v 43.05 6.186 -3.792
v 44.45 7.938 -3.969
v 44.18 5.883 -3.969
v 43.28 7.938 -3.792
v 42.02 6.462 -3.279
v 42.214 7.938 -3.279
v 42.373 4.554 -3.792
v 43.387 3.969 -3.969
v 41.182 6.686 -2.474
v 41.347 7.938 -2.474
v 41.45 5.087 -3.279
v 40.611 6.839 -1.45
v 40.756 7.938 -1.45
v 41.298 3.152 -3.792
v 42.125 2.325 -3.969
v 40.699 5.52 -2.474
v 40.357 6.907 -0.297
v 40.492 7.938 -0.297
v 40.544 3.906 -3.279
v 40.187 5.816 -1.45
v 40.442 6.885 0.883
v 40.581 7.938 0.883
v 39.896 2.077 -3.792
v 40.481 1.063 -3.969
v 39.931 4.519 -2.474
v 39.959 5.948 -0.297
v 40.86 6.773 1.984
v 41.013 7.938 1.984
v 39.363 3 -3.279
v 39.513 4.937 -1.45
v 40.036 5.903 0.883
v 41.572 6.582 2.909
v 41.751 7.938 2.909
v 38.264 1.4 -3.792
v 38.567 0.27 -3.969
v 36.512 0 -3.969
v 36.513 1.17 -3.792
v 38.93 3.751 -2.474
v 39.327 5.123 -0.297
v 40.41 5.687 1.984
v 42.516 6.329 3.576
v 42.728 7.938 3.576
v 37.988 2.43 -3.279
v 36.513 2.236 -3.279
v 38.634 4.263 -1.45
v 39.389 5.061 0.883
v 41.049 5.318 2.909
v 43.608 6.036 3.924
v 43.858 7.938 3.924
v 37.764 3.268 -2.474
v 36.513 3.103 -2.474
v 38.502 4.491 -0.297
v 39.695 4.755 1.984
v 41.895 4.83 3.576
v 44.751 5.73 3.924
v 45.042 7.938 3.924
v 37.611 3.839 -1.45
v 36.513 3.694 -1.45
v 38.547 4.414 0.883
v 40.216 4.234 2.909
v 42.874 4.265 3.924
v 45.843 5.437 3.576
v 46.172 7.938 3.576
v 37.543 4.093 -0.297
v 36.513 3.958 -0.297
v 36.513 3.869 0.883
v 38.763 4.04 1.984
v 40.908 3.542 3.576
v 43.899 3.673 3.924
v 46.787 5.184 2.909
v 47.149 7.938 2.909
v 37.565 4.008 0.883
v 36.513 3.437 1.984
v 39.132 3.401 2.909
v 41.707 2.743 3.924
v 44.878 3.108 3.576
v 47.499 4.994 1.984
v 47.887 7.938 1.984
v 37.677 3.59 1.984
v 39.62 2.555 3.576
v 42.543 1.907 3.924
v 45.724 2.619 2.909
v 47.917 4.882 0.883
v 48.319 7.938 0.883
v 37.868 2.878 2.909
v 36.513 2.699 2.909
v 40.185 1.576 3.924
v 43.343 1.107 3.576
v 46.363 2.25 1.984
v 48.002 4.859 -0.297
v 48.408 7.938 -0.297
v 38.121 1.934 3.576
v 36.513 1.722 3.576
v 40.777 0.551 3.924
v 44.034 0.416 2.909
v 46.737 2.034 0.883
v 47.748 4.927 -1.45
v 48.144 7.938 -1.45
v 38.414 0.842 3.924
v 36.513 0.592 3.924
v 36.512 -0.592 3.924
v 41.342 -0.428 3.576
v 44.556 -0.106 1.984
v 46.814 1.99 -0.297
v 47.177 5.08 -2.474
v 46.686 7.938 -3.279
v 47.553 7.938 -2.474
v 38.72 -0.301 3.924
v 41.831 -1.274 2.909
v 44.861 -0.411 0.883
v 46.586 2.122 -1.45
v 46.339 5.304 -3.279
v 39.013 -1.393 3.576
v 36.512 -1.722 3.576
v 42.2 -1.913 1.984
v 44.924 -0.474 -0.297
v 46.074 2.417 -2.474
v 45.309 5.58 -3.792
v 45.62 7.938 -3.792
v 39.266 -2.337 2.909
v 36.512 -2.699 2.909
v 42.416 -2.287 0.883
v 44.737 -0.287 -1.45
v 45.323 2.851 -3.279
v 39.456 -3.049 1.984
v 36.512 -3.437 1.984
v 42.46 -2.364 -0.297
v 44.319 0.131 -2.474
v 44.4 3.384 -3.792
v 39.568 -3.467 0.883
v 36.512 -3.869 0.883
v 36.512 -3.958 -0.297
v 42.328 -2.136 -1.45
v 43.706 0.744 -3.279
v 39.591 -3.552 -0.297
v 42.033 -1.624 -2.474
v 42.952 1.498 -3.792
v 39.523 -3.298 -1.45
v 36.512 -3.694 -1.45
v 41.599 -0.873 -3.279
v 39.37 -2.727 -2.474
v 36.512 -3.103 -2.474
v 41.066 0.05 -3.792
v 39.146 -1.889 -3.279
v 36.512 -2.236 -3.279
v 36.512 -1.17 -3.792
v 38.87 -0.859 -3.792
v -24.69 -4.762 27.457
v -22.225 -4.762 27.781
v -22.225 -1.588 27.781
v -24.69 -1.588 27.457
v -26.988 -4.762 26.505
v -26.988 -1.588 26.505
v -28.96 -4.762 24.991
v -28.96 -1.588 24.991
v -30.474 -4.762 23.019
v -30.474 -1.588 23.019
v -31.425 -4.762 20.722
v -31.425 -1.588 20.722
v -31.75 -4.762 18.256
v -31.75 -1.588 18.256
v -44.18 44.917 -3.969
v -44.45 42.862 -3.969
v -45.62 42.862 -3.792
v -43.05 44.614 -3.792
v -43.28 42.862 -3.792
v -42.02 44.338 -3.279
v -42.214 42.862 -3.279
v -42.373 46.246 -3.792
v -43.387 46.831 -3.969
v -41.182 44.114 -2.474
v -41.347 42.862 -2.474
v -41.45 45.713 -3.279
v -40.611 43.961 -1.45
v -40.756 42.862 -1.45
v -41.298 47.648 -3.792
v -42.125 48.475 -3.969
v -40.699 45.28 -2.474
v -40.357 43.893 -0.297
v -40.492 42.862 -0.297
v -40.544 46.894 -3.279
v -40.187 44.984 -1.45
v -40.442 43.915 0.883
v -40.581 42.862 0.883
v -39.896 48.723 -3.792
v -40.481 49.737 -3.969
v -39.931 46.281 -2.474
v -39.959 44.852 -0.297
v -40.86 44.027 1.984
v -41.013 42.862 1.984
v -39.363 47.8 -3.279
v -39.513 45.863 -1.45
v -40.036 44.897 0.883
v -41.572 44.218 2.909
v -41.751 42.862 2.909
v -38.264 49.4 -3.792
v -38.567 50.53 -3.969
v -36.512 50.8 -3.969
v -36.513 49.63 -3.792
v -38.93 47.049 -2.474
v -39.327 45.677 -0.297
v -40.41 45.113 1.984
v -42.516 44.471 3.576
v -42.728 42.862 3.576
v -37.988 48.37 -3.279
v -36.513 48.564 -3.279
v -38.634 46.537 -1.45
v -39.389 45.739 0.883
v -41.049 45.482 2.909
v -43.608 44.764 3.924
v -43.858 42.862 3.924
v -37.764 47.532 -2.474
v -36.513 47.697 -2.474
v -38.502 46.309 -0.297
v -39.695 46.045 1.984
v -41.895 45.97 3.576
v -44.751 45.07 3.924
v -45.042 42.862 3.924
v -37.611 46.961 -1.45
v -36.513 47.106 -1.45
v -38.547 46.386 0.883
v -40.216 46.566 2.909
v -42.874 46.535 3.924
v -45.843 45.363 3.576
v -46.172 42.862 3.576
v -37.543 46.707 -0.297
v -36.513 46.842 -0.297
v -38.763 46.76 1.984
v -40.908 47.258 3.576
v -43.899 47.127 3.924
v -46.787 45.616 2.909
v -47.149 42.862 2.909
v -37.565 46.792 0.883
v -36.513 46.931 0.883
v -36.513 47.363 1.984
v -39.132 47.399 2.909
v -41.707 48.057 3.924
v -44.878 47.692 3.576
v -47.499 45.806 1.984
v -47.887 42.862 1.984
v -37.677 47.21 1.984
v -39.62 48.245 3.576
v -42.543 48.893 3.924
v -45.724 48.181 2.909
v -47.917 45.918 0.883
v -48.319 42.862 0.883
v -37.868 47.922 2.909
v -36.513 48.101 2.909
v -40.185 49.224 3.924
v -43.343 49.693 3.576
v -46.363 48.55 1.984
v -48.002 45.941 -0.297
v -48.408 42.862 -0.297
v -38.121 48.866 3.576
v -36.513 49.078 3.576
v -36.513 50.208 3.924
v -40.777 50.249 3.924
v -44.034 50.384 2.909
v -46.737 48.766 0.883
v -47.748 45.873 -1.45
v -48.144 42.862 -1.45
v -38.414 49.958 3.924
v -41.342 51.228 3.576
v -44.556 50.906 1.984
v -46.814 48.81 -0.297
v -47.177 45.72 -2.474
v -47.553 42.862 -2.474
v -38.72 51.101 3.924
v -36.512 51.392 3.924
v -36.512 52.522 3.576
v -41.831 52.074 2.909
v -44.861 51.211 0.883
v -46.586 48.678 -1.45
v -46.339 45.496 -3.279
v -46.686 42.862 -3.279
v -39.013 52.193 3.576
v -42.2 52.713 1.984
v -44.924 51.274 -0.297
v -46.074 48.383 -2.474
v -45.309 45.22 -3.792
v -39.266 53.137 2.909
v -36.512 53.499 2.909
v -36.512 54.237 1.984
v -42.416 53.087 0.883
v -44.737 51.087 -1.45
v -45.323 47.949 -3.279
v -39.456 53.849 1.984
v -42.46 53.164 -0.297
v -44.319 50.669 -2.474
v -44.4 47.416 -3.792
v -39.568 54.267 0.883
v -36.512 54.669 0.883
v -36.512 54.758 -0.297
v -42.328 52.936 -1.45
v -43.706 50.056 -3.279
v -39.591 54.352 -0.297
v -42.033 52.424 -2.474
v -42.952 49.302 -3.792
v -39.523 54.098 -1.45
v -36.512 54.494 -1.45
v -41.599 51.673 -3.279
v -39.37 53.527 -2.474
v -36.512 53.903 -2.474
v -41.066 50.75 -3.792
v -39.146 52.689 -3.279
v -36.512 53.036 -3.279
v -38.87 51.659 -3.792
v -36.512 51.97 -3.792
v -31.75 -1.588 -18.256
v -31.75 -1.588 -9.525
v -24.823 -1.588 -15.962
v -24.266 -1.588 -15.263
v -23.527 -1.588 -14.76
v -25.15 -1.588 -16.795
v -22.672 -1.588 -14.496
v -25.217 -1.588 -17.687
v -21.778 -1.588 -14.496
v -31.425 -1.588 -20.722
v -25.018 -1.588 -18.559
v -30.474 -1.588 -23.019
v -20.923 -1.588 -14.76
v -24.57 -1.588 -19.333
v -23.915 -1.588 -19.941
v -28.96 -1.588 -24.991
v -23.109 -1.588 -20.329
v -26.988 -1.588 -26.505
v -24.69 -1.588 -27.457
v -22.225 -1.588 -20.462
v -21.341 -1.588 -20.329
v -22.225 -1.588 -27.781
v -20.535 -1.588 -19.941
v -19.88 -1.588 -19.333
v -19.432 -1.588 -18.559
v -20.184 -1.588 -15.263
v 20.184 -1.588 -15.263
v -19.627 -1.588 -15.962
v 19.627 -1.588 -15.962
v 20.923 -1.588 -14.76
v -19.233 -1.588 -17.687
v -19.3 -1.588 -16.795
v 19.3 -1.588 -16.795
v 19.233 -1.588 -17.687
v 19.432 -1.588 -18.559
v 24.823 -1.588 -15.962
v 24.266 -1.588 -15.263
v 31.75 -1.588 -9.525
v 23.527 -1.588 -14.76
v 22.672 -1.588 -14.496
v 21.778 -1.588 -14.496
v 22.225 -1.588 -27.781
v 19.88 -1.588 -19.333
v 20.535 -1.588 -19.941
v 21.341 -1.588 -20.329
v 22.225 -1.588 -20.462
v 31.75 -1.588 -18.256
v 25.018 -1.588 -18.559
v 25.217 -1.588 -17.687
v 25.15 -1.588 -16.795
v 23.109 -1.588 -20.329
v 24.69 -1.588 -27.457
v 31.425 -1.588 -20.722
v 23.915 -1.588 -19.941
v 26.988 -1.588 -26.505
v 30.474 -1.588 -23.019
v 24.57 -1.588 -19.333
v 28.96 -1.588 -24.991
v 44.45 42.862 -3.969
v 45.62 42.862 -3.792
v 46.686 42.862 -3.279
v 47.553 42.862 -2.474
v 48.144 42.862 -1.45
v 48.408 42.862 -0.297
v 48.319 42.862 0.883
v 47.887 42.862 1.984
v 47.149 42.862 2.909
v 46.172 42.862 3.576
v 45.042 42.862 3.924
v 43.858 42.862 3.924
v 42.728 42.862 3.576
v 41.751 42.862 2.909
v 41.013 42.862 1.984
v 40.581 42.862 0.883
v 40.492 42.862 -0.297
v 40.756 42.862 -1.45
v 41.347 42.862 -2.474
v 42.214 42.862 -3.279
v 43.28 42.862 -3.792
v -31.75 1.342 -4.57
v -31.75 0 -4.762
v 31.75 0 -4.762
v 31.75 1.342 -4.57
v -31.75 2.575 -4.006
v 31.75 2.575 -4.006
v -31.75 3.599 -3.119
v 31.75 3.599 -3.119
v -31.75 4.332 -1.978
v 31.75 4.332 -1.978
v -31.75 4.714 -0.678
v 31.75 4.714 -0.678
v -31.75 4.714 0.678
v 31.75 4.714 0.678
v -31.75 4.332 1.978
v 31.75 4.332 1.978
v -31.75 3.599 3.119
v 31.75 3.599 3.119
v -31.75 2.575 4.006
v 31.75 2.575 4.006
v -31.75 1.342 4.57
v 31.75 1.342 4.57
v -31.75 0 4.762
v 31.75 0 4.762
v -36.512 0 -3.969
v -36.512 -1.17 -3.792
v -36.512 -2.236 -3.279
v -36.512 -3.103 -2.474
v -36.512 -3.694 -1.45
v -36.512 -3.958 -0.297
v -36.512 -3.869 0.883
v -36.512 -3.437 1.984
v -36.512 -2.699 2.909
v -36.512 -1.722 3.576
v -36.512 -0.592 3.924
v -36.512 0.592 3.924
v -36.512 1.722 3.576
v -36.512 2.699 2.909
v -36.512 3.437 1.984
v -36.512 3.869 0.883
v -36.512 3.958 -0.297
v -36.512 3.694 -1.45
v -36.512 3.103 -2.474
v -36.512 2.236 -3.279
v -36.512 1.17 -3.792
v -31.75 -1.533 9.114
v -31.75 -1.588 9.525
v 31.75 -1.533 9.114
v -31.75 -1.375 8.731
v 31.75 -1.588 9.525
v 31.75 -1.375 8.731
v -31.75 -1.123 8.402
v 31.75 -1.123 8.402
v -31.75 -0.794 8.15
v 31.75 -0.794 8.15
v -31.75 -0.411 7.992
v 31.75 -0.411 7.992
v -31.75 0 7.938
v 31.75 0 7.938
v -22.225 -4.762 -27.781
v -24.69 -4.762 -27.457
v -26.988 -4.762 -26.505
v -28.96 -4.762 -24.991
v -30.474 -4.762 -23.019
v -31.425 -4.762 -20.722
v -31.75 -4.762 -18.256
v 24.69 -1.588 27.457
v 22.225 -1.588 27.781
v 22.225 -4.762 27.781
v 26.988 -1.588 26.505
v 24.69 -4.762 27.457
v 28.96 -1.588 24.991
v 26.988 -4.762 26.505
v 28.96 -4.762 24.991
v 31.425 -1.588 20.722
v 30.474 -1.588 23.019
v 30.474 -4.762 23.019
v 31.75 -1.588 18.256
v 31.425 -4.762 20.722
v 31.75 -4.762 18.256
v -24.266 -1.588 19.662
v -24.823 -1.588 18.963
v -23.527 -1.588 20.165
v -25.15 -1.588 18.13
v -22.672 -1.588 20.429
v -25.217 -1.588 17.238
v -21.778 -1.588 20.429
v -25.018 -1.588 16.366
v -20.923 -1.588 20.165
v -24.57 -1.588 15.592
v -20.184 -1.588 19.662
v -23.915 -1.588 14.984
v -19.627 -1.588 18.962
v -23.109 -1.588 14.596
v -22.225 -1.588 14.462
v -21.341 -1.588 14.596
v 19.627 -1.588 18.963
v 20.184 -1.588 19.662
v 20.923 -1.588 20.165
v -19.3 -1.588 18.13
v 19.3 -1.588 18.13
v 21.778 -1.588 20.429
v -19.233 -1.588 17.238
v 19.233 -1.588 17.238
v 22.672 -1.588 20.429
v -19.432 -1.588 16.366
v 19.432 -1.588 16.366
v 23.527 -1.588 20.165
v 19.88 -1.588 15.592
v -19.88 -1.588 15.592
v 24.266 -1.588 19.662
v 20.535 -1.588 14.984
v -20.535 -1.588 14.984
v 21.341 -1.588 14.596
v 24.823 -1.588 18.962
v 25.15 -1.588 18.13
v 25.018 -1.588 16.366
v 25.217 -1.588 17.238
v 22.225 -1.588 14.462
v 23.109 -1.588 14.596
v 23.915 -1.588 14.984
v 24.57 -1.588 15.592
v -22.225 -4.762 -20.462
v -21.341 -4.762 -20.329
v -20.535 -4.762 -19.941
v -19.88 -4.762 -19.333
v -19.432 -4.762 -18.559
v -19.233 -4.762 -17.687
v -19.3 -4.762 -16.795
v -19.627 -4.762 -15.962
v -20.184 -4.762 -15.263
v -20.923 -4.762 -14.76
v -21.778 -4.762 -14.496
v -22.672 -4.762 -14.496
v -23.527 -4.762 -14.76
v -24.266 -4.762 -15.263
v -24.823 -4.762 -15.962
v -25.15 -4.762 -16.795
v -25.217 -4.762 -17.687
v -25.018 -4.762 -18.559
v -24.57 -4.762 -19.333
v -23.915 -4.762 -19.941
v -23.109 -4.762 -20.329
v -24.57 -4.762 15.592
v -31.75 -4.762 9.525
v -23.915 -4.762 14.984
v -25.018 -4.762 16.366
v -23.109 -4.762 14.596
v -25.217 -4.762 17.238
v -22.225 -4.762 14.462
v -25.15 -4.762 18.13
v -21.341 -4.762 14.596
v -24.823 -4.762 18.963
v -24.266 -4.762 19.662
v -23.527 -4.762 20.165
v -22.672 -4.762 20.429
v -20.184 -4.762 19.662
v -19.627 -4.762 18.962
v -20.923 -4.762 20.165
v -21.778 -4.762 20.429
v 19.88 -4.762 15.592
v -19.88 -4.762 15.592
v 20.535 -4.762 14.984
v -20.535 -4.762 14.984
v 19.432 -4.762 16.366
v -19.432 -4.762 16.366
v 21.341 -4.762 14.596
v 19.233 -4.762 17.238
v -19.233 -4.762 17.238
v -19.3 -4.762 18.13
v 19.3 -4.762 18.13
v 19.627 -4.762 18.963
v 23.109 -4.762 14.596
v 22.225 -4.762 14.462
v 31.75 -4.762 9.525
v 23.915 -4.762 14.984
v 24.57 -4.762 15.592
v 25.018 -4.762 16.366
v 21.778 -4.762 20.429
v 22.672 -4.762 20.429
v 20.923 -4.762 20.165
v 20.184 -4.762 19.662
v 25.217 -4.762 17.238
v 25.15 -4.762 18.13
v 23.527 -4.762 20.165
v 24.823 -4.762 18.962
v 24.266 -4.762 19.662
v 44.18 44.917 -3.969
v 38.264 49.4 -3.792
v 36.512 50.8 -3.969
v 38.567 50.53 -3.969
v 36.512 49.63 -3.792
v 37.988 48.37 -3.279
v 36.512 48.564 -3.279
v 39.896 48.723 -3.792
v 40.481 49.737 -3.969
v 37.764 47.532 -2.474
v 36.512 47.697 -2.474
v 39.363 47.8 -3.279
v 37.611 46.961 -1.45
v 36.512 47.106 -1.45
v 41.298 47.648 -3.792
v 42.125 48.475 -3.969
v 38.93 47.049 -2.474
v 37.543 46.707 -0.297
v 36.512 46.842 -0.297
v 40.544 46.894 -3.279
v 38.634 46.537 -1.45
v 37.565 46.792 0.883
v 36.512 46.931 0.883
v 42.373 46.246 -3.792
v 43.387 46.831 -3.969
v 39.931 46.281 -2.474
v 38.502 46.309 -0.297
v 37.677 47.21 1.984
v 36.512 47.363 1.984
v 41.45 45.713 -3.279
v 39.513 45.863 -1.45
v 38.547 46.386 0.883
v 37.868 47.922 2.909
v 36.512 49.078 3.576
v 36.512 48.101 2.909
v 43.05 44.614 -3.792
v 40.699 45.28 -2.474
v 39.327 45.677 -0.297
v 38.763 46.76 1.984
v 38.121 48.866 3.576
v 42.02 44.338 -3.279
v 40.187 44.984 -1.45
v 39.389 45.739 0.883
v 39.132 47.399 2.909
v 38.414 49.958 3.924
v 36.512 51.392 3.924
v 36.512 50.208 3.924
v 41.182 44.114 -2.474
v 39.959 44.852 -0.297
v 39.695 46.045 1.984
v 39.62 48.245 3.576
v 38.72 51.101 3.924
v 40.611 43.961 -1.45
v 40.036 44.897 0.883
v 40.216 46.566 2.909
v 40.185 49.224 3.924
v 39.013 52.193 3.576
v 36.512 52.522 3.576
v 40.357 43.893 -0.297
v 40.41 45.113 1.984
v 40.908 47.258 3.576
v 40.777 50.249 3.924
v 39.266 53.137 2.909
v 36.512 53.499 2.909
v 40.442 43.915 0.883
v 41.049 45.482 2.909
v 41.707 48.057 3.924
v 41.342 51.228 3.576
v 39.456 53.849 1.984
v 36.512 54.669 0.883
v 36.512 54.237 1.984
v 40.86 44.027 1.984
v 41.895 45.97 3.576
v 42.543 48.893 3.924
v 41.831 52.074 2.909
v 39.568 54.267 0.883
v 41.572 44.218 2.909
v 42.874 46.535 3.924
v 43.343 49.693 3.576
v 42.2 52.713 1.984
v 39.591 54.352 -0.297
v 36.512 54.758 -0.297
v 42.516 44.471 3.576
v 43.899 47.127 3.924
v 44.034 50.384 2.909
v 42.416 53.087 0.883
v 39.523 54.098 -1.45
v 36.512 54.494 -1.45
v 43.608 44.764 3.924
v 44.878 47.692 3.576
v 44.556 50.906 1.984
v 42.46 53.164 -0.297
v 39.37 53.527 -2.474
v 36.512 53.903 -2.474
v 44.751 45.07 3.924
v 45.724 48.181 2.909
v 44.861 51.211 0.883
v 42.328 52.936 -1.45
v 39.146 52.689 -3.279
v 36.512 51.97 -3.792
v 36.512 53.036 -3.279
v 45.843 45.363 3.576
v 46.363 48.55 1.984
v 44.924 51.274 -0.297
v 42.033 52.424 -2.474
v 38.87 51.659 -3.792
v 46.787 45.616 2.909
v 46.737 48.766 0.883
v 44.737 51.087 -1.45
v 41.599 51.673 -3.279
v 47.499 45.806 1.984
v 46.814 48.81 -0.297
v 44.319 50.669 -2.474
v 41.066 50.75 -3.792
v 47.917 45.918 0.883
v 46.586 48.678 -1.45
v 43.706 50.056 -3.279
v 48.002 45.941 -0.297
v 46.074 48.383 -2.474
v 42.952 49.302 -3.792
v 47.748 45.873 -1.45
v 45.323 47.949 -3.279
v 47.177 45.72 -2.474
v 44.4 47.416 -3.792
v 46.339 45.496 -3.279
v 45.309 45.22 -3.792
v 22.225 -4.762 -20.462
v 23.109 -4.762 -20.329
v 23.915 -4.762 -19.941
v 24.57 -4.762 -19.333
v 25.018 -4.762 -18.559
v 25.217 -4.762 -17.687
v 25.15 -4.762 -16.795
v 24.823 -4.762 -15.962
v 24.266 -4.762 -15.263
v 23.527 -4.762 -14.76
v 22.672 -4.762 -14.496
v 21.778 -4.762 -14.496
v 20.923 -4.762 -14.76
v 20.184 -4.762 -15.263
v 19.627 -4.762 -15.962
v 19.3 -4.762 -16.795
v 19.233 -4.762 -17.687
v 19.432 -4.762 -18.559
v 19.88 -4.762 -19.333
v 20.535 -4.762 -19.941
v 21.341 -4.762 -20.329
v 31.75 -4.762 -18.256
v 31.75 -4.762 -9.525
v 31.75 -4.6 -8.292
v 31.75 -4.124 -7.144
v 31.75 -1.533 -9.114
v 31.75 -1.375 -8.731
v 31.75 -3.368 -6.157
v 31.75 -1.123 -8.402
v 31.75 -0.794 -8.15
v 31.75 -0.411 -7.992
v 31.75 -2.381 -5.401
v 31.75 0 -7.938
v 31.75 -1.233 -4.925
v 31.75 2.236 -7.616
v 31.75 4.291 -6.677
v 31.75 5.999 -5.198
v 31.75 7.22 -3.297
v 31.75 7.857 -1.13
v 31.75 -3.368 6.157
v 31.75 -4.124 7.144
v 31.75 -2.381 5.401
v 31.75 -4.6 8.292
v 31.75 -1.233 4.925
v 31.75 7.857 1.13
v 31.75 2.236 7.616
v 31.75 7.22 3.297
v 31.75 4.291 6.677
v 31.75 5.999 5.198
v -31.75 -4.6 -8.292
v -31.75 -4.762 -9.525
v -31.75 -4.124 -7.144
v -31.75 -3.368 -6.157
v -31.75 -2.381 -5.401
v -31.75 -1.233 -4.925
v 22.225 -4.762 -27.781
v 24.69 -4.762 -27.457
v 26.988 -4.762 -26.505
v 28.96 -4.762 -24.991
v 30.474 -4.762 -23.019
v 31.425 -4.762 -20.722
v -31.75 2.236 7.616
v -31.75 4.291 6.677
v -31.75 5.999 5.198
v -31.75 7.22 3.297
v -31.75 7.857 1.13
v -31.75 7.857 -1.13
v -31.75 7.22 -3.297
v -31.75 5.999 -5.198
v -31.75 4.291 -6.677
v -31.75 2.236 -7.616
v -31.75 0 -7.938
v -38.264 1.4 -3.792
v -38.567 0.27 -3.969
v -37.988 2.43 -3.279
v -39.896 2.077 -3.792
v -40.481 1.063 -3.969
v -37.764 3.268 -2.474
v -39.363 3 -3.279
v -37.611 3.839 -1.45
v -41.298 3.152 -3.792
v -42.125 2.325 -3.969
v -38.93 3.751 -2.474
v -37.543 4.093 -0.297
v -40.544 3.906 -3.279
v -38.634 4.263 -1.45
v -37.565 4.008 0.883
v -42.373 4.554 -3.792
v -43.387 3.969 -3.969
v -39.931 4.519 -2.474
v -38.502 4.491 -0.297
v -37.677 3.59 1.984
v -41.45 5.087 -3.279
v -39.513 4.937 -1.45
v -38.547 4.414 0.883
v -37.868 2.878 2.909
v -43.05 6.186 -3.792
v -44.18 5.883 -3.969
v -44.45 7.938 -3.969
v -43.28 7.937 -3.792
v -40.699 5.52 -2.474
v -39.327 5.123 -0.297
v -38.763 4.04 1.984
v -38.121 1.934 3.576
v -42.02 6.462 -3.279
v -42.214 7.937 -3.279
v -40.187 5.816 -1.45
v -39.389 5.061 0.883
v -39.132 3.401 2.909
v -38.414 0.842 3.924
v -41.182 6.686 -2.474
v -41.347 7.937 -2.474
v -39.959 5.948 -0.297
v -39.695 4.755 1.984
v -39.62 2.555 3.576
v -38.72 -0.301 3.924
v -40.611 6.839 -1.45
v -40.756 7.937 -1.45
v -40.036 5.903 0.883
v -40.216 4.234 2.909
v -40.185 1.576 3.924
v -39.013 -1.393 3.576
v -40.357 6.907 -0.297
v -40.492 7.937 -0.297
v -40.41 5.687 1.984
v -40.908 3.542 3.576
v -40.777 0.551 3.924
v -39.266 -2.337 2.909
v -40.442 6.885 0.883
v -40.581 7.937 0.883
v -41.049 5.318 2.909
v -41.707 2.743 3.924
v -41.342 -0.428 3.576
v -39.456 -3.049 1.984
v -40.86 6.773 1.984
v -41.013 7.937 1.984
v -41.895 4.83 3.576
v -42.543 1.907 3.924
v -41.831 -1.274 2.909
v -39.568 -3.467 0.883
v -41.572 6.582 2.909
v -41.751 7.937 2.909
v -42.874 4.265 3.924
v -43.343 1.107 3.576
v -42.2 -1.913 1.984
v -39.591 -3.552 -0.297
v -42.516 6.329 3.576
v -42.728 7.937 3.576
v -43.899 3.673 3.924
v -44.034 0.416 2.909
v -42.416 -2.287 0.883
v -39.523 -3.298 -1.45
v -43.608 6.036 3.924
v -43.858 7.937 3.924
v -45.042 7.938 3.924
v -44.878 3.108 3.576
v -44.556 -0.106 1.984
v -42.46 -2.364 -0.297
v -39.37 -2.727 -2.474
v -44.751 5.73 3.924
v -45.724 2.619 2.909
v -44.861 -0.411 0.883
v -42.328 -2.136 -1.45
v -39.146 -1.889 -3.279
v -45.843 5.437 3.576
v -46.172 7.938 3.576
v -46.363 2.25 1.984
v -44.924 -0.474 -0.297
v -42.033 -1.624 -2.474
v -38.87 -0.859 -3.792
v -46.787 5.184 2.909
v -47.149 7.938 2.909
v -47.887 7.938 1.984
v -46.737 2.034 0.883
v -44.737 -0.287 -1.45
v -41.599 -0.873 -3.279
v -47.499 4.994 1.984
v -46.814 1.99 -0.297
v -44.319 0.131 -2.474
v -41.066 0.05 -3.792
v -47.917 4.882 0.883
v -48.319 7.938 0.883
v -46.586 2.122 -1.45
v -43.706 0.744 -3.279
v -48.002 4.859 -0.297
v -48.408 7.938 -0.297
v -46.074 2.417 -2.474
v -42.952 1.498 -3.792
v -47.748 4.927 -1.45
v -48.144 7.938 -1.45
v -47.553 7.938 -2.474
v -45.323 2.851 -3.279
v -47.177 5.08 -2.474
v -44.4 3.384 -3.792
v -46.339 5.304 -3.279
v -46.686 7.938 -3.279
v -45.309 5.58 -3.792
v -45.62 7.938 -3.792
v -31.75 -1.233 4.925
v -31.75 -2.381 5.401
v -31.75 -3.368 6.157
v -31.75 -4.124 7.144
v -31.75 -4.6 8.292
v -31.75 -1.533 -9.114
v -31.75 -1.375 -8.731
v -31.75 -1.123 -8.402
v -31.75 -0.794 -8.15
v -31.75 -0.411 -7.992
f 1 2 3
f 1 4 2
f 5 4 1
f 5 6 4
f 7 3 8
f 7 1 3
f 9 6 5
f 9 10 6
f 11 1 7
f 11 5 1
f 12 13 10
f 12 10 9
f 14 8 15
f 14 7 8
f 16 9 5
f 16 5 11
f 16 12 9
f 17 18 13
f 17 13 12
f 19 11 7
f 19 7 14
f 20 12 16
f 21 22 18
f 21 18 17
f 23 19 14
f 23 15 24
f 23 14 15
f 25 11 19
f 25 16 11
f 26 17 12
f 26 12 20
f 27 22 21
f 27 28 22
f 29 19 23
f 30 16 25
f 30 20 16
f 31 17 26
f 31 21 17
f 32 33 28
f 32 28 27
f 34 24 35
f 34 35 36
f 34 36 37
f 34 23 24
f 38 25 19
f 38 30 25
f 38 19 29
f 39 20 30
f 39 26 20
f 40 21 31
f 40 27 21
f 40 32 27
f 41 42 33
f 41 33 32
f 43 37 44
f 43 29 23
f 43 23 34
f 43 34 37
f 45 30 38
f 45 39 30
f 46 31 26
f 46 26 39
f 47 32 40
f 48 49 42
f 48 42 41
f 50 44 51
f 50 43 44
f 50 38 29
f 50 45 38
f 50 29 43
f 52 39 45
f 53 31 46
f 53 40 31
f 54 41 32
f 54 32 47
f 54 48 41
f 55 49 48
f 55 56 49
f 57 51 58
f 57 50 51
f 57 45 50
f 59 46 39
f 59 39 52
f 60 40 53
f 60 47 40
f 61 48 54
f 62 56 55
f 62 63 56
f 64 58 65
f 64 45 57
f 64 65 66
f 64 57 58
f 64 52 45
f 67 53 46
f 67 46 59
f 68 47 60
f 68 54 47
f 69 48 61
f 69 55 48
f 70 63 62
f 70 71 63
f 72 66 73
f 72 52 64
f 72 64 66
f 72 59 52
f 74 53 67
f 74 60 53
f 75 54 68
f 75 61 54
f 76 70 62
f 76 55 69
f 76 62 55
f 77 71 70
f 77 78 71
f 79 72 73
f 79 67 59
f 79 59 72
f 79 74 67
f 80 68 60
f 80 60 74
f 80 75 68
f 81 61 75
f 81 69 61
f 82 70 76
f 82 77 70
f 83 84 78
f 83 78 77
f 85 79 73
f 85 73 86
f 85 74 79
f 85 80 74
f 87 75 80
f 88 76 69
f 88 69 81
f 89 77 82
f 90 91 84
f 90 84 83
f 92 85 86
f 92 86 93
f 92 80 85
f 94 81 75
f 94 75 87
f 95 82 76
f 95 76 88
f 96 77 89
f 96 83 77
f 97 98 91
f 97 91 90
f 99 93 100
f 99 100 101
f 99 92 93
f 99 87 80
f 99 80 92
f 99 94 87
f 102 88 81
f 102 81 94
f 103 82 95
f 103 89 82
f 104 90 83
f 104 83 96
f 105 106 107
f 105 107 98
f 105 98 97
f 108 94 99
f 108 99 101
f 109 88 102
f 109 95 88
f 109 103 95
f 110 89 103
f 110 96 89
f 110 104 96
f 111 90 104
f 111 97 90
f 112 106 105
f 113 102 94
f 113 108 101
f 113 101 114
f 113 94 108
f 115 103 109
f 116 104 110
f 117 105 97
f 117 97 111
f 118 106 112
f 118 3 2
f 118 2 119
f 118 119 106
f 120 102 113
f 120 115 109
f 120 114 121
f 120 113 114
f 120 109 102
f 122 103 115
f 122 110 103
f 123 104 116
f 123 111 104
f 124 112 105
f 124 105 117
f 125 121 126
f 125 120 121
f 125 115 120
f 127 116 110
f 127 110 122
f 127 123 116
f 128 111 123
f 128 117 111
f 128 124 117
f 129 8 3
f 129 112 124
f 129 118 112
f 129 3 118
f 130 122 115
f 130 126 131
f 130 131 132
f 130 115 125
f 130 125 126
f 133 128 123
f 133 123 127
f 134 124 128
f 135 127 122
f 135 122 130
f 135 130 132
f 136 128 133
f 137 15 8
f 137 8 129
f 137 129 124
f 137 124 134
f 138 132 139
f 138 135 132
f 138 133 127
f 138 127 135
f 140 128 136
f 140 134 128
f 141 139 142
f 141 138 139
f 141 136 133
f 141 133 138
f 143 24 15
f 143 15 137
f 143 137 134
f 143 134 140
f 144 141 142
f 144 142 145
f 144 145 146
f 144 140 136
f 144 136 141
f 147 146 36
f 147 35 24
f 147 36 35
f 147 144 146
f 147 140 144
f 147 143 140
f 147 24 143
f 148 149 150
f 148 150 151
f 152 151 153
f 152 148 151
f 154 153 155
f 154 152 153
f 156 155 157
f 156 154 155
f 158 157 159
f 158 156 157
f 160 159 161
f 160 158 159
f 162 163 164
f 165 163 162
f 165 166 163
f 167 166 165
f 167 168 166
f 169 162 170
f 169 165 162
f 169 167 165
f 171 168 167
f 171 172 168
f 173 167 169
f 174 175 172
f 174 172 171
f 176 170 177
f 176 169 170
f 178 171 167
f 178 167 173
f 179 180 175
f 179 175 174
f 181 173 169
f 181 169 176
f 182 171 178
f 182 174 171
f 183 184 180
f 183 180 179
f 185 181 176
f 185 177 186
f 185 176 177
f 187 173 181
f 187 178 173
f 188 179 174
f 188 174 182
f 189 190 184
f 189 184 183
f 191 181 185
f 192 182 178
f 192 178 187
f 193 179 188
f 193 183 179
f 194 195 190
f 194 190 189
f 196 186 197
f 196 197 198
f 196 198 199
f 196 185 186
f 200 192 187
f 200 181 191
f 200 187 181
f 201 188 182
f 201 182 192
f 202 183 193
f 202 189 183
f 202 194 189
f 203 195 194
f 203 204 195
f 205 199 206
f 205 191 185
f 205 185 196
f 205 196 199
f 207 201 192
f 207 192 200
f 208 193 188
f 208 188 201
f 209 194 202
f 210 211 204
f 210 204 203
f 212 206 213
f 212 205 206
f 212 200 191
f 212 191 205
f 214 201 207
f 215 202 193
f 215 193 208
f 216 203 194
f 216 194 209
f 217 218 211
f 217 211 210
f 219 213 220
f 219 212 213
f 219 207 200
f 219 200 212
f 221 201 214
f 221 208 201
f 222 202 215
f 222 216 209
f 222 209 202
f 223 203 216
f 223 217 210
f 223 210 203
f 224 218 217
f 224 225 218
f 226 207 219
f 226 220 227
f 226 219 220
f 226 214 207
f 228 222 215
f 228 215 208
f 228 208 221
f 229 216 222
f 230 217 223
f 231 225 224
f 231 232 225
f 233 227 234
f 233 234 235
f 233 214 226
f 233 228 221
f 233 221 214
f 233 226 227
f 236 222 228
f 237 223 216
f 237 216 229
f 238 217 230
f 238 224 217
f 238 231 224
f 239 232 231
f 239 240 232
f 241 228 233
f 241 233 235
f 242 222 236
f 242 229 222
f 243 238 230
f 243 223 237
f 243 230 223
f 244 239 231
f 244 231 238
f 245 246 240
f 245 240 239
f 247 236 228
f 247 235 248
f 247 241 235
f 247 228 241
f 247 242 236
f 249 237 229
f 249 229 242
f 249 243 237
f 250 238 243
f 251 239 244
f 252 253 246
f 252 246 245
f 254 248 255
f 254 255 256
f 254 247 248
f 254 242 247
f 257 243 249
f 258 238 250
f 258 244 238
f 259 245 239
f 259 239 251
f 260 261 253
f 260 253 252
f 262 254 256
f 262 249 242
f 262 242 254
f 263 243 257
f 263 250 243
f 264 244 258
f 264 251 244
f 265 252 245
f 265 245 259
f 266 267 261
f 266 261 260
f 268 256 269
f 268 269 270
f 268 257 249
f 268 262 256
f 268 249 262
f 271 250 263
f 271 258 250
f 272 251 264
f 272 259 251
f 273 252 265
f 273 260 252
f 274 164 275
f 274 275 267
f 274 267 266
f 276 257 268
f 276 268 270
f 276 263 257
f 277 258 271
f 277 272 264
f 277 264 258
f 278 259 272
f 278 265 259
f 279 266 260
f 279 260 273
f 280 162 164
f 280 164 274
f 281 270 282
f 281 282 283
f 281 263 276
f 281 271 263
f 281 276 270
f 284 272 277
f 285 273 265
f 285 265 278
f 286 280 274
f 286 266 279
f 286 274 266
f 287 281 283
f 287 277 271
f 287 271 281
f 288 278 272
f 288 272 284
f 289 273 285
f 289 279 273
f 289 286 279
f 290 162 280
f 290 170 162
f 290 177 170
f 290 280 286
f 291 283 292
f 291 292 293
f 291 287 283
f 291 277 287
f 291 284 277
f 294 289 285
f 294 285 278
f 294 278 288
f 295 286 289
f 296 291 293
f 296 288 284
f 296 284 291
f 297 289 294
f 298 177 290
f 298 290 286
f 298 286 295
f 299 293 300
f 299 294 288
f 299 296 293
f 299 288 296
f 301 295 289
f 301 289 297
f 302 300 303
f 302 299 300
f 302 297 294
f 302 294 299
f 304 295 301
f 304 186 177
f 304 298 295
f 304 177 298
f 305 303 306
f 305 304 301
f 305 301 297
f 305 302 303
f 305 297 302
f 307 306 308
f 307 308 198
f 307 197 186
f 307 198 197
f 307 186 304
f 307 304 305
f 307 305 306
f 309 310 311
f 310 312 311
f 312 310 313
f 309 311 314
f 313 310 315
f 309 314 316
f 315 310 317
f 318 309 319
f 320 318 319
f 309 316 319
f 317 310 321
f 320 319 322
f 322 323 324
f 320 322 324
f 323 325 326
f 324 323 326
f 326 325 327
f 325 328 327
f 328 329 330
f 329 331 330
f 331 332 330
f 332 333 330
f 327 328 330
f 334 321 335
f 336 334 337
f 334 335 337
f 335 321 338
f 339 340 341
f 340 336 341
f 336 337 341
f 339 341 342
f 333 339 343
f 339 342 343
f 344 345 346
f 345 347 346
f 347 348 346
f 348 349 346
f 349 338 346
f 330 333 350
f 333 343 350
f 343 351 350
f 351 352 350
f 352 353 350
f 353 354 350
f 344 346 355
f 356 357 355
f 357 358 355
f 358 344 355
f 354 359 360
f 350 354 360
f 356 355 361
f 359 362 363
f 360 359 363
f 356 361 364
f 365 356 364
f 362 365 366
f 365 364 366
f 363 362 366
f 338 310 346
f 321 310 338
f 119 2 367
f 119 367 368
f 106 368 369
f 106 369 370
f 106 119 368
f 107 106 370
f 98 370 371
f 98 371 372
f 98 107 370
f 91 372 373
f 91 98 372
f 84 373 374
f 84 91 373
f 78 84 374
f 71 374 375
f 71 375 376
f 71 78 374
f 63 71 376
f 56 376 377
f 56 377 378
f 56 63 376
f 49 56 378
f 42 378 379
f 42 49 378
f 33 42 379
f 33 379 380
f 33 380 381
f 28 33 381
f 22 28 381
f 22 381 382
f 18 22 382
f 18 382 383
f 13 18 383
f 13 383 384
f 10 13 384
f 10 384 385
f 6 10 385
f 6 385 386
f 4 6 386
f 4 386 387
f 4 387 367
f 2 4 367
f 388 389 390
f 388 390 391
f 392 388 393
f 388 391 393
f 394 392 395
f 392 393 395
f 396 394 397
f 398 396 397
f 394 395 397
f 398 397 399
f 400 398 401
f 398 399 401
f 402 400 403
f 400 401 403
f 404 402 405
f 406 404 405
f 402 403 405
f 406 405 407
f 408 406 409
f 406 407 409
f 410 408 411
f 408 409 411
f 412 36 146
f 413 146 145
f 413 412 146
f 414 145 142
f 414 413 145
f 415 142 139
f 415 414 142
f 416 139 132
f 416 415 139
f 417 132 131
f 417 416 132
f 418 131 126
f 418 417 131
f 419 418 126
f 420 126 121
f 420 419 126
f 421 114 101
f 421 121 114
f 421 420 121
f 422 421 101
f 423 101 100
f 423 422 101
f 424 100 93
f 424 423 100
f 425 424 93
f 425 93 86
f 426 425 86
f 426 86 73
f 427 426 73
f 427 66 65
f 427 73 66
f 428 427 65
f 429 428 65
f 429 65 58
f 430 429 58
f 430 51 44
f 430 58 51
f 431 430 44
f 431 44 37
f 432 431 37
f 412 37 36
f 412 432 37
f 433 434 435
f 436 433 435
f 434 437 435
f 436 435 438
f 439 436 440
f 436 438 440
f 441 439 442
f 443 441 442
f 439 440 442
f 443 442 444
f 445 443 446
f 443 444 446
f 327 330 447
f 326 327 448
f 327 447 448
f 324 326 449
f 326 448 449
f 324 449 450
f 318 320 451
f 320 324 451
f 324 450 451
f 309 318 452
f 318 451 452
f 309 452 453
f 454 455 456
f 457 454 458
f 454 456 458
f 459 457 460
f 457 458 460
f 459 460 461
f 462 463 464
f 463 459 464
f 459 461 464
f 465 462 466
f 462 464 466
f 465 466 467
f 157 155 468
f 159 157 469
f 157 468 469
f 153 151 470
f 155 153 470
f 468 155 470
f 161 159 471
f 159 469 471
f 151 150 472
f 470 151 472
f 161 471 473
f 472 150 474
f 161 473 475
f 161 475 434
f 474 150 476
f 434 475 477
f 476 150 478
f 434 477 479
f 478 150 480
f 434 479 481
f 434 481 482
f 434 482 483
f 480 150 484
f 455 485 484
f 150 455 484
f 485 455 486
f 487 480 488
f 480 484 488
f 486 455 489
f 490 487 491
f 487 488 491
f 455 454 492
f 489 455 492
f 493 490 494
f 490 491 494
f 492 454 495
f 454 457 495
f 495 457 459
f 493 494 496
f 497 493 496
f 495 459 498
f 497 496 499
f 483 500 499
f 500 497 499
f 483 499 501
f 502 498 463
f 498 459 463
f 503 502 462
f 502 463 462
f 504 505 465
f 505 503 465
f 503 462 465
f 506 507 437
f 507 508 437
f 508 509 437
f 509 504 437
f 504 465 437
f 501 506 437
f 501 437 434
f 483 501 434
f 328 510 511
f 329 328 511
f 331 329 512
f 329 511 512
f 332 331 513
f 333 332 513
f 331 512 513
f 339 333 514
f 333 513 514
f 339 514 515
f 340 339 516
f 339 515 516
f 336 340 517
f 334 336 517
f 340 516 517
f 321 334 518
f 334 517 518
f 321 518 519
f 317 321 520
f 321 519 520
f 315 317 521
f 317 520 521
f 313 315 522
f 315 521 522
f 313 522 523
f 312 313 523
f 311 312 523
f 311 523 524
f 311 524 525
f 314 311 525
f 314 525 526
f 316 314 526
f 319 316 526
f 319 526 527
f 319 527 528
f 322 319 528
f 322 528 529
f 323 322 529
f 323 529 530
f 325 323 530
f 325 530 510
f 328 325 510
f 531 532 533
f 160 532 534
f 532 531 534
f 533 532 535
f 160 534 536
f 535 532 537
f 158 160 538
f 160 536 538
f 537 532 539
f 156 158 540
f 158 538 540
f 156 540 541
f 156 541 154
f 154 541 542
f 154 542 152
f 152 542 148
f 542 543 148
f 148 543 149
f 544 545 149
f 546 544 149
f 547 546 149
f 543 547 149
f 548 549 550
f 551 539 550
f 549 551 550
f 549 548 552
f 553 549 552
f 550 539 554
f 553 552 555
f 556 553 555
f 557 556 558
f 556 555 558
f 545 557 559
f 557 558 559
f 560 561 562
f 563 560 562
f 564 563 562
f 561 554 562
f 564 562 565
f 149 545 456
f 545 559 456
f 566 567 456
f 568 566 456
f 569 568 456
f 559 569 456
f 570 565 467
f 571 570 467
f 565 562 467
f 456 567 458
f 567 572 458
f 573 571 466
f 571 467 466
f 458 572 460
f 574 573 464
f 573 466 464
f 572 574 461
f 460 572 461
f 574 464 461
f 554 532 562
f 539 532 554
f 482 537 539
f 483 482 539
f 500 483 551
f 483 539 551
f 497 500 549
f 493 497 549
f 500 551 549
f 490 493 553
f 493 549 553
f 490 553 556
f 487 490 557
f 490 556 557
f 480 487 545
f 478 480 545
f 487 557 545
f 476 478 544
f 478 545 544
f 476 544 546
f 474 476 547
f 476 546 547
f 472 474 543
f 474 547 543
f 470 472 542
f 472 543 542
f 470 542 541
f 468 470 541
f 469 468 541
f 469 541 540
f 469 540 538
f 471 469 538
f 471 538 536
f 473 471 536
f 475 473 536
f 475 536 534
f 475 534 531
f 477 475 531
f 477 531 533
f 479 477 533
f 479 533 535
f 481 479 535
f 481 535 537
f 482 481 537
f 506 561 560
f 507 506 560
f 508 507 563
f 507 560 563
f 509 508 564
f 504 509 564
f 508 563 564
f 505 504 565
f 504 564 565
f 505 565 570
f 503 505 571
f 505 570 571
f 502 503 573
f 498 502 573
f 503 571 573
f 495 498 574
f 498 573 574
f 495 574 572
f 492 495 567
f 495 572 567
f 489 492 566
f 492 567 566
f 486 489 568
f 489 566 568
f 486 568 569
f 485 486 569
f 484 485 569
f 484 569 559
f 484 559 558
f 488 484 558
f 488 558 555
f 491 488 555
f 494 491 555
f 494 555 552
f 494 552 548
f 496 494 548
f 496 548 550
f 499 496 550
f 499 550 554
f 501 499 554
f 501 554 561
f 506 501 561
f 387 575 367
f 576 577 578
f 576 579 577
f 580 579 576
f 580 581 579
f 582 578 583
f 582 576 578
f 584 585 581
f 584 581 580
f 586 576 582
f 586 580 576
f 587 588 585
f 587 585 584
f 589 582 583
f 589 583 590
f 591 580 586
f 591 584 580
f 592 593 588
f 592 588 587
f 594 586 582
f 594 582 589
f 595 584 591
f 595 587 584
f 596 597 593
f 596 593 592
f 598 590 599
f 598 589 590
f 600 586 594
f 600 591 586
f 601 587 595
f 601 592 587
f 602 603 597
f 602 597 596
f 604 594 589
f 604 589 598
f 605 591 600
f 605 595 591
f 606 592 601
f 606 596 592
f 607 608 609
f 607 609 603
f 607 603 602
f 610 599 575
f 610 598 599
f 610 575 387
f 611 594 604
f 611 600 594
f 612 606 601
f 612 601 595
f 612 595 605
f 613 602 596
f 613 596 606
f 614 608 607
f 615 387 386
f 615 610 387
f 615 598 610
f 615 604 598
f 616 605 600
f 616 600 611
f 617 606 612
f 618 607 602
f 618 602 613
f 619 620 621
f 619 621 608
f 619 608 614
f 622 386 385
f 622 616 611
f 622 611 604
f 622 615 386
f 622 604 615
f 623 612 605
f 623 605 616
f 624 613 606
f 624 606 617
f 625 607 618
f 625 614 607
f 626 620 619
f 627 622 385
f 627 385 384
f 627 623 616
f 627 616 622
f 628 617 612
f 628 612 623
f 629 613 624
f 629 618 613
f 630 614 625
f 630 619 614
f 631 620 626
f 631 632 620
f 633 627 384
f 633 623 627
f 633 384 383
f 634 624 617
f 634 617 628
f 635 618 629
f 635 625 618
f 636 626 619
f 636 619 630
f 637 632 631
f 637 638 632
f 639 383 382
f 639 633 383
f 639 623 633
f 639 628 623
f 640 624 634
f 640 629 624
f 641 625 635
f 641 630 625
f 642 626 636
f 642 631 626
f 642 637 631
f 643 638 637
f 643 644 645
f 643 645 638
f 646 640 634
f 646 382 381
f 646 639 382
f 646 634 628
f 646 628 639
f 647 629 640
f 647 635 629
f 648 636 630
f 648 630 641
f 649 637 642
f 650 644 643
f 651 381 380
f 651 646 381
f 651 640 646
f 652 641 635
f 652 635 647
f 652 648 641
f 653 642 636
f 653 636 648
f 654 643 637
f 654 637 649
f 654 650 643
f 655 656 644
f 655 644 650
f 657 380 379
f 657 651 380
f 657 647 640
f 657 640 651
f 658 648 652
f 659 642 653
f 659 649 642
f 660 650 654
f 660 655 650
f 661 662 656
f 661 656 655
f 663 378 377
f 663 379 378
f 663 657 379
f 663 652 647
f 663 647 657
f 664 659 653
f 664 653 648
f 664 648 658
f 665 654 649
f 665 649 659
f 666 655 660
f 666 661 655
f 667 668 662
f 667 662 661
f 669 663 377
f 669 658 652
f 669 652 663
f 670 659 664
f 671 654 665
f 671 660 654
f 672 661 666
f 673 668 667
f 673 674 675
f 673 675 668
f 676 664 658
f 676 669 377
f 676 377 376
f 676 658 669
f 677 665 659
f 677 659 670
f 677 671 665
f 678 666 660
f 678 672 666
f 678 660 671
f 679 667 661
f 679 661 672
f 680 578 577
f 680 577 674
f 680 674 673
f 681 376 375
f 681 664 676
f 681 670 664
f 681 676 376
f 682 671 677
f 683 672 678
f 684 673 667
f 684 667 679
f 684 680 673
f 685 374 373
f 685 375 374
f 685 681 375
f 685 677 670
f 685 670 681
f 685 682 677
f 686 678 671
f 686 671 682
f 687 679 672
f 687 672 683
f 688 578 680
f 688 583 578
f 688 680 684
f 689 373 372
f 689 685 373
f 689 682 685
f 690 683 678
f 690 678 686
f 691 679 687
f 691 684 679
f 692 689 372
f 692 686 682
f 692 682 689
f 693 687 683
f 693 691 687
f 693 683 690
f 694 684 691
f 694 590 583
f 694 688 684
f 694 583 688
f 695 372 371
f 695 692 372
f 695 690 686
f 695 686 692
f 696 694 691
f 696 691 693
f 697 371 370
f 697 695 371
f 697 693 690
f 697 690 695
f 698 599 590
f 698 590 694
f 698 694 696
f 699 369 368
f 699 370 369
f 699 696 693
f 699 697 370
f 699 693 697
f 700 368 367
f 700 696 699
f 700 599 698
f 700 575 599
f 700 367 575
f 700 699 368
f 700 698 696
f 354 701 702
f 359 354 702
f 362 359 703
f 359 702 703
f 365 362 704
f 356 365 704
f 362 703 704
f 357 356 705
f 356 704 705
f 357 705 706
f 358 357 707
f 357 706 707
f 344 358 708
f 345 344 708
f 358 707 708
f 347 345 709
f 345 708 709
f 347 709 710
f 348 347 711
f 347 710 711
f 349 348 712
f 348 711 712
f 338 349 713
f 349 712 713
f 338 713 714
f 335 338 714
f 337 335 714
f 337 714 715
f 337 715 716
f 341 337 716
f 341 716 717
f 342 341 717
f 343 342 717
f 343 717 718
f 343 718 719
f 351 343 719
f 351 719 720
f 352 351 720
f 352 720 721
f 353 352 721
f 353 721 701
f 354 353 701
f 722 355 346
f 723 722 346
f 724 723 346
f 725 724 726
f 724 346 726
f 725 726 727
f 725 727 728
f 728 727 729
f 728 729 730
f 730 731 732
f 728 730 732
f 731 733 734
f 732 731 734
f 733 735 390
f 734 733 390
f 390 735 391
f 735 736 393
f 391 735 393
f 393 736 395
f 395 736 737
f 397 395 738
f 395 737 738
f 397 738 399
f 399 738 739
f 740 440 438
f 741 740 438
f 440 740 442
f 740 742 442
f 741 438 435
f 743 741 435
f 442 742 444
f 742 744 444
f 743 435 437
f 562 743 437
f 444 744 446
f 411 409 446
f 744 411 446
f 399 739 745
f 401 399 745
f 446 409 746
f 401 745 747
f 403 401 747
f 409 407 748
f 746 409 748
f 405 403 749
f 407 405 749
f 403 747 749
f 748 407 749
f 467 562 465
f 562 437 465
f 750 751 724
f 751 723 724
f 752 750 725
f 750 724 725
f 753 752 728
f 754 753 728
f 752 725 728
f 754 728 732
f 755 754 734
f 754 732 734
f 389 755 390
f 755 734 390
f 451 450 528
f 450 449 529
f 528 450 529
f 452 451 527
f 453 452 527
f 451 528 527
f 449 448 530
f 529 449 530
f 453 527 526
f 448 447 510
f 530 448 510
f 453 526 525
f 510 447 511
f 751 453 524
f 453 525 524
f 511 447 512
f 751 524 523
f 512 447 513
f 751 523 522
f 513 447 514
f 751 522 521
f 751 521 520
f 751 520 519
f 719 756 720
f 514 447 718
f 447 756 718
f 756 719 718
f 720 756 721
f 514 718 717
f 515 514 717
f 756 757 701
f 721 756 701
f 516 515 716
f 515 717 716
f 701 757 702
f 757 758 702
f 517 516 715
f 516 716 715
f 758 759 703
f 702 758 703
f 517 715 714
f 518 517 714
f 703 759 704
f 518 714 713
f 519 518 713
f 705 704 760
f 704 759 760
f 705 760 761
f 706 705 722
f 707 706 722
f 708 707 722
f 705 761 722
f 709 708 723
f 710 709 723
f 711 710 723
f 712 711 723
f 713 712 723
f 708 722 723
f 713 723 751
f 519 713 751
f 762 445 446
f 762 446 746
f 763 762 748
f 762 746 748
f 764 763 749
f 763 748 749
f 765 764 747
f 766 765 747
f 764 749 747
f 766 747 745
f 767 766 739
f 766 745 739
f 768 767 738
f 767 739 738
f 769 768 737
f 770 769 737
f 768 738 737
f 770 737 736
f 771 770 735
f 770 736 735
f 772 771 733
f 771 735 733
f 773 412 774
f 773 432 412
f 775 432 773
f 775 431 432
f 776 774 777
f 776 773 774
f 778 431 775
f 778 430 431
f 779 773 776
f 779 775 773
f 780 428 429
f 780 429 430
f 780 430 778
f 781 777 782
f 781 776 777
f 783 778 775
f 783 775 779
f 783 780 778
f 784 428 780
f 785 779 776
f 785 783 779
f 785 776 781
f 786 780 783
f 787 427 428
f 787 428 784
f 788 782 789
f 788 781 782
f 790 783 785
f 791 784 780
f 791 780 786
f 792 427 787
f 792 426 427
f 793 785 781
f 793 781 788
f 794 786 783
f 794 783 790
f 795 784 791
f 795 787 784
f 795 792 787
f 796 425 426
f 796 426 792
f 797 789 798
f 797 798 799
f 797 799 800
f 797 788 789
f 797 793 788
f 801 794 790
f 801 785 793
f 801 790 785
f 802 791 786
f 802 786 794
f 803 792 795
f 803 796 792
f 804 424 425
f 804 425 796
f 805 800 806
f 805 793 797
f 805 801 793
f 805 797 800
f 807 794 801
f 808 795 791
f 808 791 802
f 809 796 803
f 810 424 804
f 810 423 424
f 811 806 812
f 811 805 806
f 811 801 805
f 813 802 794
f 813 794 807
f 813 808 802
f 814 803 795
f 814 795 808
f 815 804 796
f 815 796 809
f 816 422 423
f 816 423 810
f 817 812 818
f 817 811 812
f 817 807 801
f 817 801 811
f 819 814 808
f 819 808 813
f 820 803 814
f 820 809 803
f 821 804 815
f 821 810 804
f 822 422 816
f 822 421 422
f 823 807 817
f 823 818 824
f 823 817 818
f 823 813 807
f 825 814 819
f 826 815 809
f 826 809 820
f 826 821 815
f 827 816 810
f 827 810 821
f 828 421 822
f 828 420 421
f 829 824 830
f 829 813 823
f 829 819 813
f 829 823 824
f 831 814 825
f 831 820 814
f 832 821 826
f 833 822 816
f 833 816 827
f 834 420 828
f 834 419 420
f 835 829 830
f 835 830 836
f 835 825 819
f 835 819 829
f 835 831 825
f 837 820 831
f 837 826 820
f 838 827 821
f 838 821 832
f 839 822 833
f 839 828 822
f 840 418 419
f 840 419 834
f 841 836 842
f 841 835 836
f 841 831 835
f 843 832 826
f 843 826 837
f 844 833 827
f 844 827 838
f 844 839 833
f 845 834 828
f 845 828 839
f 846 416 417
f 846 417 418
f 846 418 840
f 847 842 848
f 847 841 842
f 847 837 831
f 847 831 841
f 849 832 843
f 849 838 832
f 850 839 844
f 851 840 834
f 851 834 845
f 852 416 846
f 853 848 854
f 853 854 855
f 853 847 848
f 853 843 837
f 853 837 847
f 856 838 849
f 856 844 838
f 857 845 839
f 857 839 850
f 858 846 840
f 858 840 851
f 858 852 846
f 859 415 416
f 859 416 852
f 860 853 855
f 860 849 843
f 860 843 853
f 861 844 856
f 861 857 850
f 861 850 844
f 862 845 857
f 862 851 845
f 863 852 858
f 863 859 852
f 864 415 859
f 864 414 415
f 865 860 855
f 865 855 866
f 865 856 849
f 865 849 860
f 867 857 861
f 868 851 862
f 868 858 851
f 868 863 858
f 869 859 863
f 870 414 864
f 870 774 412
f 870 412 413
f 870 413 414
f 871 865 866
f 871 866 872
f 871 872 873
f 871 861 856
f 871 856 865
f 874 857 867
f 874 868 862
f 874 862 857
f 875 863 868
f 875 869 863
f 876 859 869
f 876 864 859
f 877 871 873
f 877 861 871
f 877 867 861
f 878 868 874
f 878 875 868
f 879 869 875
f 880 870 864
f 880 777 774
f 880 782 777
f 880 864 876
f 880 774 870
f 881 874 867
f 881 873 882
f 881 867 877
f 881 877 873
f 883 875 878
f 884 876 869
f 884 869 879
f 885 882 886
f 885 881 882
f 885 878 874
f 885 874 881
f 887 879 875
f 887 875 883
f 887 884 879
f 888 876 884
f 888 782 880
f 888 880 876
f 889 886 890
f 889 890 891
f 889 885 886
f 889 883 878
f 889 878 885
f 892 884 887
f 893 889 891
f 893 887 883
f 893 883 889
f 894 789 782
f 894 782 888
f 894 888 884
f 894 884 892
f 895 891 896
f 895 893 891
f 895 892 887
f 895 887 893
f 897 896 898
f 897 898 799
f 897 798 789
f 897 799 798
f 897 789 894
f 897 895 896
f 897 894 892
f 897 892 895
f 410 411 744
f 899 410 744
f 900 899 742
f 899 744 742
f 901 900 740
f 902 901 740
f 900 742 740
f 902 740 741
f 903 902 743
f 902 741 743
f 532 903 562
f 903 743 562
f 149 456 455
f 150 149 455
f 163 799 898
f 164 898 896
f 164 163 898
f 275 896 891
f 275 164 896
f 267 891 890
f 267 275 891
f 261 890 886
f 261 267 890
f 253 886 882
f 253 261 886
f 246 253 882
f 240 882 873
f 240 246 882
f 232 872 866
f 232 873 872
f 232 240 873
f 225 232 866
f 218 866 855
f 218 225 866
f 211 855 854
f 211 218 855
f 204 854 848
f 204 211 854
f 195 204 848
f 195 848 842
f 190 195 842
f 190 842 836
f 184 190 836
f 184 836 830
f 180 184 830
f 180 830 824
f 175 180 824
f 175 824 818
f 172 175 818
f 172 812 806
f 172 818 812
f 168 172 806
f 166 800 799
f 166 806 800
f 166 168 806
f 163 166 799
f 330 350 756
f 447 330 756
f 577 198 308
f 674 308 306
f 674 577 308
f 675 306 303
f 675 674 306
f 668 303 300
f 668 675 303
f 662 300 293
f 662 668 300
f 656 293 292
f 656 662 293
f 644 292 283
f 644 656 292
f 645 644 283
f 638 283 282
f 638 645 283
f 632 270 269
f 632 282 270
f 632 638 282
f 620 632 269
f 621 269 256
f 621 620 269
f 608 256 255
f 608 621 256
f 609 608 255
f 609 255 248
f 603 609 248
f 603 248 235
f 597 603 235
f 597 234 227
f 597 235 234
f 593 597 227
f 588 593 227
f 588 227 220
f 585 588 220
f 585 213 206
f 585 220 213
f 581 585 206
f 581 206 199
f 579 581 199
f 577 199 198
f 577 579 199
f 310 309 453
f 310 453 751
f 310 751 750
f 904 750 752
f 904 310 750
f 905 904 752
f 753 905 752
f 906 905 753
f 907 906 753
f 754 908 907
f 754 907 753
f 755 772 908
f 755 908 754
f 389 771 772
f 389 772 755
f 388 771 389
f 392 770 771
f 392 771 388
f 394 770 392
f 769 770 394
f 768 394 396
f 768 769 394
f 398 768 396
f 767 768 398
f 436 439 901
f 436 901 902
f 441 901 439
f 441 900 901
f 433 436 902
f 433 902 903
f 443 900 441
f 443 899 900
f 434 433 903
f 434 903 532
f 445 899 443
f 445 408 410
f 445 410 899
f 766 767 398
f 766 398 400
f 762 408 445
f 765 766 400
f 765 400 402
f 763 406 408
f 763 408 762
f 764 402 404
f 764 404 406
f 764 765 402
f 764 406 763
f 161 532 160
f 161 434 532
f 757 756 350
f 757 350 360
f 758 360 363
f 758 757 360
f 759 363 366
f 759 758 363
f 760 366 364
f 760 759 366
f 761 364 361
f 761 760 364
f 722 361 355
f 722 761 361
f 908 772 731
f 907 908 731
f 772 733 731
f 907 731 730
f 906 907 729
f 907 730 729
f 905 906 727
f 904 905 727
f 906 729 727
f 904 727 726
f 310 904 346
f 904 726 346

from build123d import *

# Parameters (mm, degrees)
SKETCH2_R           = 3.96875
BOSS_EXTRUDE1_DEPTH = 31.75
SKETCH4_R           = 3
CUT_EXTRUDE1_DEPTH  = 82.60969888


with BuildPart() as part:
    # Sweep1: sweep along a path in Sketch1
    with BuildLine(Plane.XY) as sweep1_path:
        Line((44.45, 42.8625), (44.45, 7.9375))
        ThreePointArc((44.45, 7.9375), (42.125160076, 2.324839924), (36.5125, 0))
        Line((36.5125, 0), (-36.5125, 0))
        ThreePointArc((-36.5125, 0), (-42.125160076, 2.324839924), (-44.45, 7.9375))
        Line((-44.45, 7.9375), (-44.45, 42.8625))
        ThreePointArc((-44.45, 42.8625), (-42.125160076, 48.475160076), (-36.5125, 50.8))
        Line((-36.5125, 50.8), (36.5125, 50.8))
        ThreePointArc((36.5125, 50.8), (42.125160076, 48.475160076), (44.45, 42.8625))
    # Sketch2 → Sweep1 (sweep)
    with BuildSketch(Plane(origin=(0, 0, 0), x_dir=(0, 0, -1), z_dir=(1, 0, 0))):
        Circle(SKETCH2_R)
    sweep(path=sweep1_path.line)


with BuildPart() as body_2:
    # Sketch3 → Boss-Extrude1 (new, symmetric)
    with BuildSketch(Plane(origin=(0, 0, 0), x_dir=(0, 0, -1), z_dir=(1, 0, 0))):
        with BuildLine():
            Line((-27.78125, -4.7625), (-27.78125, -1.5875))
            Line((-27.78125, -1.5875), (-9.525, -1.5875))
            ThreePointArc((-9.525, -1.5875), (-8.402467985, -1.122532015), (-7.9375, 0))
            ThreePointArc((-7.9375, 0), (0, 7.9375), (7.9375, 0))
            ThreePointArc((7.9375, 0), (8.402467985, -1.122532015), (9.525, -1.5875))
            Line((9.525, -1.5875), (27.78125, -1.5875))
            Line((27.78125, -1.5875), (27.78125, -4.7625))
            Line((27.78125, -4.7625), (9.525, -4.7625))
            ThreePointArc((9.525, -4.7625), (6.157403955, -3.367596045), (4.7625, 0))
            ThreePointArc((4.7625, 0), (0, 4.7625), (-4.7625, 0))
            ThreePointArc((-4.7625, 0), (-6.157403955, -3.367596045), (-9.525, -4.7625))
            Line((-9.525, -4.7625), (-27.78125, -4.7625))
        make_face()
    extrude(amount=BOSS_EXTRUDE1_DEPTH, both=True)

    # Sketch4 → Cut-Extrude1 (cut, through all)
    with BuildSketch(Plane.XZ.offset(4.7625)):
        with Locations(Location((-22.225, 17.4625, 0), (0, 0, 270))):
            Circle(SKETCH4_R)
        with Locations(Location((22.225, 17.4625, 0), (0, 0, 270))):
            Circle(SKETCH4_R)
        with Locations(Location((22.225, -17.4625, 0), (0, 0, 270))):
            Circle(SKETCH4_R)
        with Locations(Location((-22.225, -17.4625, 0), (0, 0, 270))):
            Circle(SKETCH4_R)
        with BuildLine():
            Line((-31.75, 18.25625), (-31.75, 27.78125))
            Line((-31.75, 27.78125), (-22.225, 27.78125))
            ThreePointArc((-22.225, 27.78125), (-28.960192091, 24.991442091), (-31.75, 18.25625))
        make_face()
        with BuildLine():
            Line((31.75, 27.78125), (22.225, 27.78125))
            ThreePointArc((22.225, 27.78125), (28.960192091, 24.991442091), (31.75, 18.25625))
            Line((31.75, 18.25625), (31.75, 27.78125))
        make_face()
        with BuildLine():
            Line((31.75, -18.25625), (31.75, -27.78125))
            Line((31.75, -27.78125), (22.225, -27.78125))
            ThreePointArc((22.225, -27.78125), (28.960192091, -24.991442091), (31.75, -18.25625))
        make_face()
        with BuildLine():
            Line((-31.75, -27.78125), (-22.225, -27.78125))
            ThreePointArc((-22.225, -27.78125), (-28.960192091, -24.991442091), (-31.75, -18.25625))
            Line((-31.75, -18.25625), (-31.75, -27.78125))
        make_face()
    extrude(amount=-CUT_EXTRUDE1_DEPTH, mode=Mode.SUBTRACT)


solid = Compound([part.part, body_2.part])
